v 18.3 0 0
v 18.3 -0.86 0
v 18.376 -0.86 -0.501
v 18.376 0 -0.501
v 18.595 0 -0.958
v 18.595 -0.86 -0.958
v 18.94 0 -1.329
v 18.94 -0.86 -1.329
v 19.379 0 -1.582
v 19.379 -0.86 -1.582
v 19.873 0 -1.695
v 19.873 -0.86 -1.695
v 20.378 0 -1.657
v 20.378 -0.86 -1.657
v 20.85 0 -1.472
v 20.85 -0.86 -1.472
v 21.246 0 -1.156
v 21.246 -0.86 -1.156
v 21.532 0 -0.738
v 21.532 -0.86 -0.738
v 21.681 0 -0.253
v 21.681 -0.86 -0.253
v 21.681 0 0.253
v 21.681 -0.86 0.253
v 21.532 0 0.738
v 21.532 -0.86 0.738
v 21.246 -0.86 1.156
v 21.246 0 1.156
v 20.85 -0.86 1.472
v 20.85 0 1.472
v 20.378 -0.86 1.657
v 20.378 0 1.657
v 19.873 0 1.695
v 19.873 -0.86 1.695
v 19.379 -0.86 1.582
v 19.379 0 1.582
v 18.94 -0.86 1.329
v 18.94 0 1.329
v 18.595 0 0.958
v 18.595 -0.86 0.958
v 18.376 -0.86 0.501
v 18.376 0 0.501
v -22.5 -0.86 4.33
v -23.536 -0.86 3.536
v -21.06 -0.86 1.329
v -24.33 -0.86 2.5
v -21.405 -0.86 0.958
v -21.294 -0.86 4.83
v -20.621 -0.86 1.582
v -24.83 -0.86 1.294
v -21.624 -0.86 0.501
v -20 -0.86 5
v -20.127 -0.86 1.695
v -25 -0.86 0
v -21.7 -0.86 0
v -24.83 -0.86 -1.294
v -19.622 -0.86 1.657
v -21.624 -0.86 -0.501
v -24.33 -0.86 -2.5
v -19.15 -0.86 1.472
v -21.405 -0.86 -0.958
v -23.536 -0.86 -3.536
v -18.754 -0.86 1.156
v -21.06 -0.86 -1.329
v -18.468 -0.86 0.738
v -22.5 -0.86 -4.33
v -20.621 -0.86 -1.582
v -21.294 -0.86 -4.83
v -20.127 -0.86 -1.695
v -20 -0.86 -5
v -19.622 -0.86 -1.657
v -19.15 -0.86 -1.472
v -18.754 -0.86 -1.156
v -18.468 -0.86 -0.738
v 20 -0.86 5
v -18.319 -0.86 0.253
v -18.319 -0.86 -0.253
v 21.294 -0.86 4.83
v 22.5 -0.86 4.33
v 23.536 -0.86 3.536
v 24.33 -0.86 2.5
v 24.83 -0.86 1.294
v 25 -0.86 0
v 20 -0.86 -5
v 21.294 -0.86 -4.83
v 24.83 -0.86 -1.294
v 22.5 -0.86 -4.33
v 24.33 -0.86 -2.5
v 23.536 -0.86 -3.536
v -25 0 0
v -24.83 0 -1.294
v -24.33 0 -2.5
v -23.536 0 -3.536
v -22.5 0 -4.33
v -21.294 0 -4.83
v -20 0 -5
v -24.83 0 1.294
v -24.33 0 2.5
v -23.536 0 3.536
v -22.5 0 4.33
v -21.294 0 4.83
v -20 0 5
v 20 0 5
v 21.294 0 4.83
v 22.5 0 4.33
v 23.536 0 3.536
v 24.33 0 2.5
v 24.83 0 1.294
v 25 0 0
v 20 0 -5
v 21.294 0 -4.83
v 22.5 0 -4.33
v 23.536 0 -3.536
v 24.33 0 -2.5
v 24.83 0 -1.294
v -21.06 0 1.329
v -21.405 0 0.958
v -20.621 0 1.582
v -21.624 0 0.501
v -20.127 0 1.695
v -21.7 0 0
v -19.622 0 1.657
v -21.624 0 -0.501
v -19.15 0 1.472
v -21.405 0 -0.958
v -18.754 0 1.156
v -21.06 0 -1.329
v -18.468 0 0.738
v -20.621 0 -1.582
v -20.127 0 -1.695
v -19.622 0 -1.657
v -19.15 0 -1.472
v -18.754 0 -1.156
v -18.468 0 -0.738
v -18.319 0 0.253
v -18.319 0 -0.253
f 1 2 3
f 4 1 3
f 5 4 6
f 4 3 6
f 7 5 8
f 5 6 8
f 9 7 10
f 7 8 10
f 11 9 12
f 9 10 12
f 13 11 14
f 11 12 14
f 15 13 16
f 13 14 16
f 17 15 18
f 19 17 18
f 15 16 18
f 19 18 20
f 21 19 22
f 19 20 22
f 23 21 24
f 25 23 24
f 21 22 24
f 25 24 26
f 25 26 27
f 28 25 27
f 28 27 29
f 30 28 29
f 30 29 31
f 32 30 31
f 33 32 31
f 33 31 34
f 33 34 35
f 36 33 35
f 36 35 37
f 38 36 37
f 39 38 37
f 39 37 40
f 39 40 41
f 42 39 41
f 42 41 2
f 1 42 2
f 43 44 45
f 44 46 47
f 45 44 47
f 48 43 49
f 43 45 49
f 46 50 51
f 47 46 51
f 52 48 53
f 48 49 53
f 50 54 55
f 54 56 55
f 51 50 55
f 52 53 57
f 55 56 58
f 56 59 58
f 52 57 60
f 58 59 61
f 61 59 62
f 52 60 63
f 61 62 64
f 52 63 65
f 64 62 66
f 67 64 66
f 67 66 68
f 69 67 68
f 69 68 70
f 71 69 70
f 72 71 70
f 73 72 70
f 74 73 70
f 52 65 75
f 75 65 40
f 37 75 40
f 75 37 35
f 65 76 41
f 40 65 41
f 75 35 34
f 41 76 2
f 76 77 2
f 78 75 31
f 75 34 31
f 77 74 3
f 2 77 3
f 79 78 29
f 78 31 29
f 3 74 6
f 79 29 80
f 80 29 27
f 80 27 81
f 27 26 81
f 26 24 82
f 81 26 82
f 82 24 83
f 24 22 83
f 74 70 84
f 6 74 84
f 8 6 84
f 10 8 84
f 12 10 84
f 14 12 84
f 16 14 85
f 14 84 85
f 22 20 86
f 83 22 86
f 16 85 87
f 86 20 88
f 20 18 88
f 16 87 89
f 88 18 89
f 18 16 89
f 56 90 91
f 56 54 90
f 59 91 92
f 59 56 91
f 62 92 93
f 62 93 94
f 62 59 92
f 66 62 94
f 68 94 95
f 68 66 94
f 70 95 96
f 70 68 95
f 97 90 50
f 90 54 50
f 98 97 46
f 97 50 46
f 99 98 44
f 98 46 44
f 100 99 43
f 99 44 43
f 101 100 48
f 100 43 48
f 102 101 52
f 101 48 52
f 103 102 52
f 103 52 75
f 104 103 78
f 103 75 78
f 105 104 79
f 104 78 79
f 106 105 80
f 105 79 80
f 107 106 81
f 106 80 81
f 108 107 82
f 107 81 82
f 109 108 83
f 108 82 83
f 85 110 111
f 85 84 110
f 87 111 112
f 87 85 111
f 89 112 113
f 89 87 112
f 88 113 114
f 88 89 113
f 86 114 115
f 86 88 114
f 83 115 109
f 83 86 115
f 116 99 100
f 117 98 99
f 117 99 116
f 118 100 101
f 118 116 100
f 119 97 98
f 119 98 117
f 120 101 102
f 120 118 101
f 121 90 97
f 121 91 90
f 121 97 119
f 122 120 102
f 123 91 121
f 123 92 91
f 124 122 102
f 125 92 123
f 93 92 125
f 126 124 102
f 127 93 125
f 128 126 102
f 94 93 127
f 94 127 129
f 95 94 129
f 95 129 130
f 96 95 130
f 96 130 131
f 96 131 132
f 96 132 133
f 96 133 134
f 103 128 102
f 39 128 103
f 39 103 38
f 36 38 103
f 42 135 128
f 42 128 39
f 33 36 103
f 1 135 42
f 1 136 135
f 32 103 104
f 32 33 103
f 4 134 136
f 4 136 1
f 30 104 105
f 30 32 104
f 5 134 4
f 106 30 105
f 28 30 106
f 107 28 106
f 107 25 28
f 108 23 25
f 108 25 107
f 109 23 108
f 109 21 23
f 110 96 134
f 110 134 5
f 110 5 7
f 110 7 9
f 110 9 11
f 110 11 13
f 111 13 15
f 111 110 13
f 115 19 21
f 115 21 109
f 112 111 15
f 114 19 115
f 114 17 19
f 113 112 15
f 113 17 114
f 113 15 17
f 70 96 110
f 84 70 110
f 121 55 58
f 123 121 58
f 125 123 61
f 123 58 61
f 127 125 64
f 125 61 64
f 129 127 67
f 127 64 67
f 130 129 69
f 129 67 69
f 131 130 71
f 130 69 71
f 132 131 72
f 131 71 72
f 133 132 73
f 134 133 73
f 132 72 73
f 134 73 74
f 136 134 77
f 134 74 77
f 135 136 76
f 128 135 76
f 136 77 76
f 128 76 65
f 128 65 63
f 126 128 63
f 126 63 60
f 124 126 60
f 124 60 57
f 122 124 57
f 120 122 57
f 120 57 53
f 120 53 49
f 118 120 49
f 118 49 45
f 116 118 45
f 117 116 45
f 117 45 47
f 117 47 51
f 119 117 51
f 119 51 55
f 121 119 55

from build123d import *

# Parameters (mm, degrees)
SKETCH1_W                = 50
SKETCH1_H                = 10
BASE_FLANGE1_DEPTH       = 0.86
M3_CLEARANCE_HOLE1_D     = 3.4
M3_CLEARANCE_HOLE1_DEPTH = 1.29
M3_CLEARANCE_HOLE1_TIP   = 1.021463052
FILLET1_R                = 5


# Sheet-metal steps are written as plain solids
with BuildPart() as part:
    # Sketch1 → Base-Flange1 (new body)
    with BuildSketch(Plane(origin=(0, 0, 0), x_dir=(1, 0, 0), z_dir=(0, 1, 0))):
        Rectangle(SKETCH1_W, SKETCH1_H)
    extrude(amount=-BASE_FLANGE1_DEPTH)

    # M3 Clearance Hole1
    with Locations(Plane(origin=(0, 0, 0), x_dir=(1, 0, 0), z_dir=(0, 1, 0))):
        with Locations((-20, 0), (20, 0)):
            Hole(M3_CLEARANCE_HOLE1_D / 2, depth=M3_CLEARANCE_HOLE1_DEPTH)
            with Locations((0, 0, -(M3_CLEARANCE_HOLE1_DEPTH + M3_CLEARANCE_HOLE1_TIP / 2))):  # 118° drill point
                Cone(0, M3_CLEARANCE_HOLE1_D / 2, M3_CLEARANCE_HOLE1_TIP, mode=Mode.SUBTRACT)

    # Fillet1
    fillet1_edges = [part.edges().sort_by_distance(p)[0] for p in [
        (25, -0.43, 5),
        (25, -0.43, -5),
        (-25, -0.43, -5),
        (-25, -0.43, 5),
    ]]
    fillet(fillet1_edges, radius=FILLET1_R - 0.0001)  # a hair under: the kernel refuses the full size


solid = part.part
